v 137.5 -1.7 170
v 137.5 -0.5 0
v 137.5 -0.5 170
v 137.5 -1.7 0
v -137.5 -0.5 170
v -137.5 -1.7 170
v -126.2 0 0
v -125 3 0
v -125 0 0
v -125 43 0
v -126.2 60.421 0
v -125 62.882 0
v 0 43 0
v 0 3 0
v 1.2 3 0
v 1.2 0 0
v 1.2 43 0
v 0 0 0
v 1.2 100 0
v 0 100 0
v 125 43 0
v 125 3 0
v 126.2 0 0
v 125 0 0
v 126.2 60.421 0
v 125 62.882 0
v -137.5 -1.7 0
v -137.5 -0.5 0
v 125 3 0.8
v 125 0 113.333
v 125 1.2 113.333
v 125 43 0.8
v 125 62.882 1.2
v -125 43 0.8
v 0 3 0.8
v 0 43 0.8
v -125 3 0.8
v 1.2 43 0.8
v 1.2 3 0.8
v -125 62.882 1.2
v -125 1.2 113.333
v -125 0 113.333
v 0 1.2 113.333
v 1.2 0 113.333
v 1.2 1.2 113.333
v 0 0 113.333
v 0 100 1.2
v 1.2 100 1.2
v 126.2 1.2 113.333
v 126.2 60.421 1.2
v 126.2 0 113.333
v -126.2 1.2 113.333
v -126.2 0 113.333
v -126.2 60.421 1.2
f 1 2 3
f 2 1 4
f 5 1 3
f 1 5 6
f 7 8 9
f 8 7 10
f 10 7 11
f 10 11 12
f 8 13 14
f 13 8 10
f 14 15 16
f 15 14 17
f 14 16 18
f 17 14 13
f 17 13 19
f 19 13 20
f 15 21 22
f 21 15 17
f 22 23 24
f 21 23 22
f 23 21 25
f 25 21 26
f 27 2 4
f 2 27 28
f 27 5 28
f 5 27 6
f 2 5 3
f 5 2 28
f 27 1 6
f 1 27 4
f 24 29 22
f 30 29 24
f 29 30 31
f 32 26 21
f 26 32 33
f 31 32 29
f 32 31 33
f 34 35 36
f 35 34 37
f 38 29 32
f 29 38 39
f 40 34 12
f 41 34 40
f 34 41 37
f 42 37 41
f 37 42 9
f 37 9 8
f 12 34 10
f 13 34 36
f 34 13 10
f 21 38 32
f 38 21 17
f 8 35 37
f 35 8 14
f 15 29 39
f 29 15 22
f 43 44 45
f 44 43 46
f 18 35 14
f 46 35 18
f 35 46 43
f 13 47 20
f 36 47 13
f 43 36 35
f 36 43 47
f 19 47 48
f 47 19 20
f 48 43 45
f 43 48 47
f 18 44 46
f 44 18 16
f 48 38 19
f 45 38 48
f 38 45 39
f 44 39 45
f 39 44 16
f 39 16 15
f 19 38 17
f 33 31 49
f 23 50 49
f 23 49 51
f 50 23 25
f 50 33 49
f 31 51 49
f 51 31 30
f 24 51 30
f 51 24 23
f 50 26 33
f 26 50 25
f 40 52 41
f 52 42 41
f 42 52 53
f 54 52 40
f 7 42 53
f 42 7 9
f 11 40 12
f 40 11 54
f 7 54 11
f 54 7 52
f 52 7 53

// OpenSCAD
wall=1.2;
z=170;
x=275;
y=wall;
main=[x,y,z];

bed_d=280;
bed_h=300;

$fn=90;

base_x=250;
base_y=40;
base_z=0.8;

base_y_offset=3;

base=[base_x,base_y,base_z];

center_y=100;
gap=0.5;

intersection() {
    cylinder(d=bed_d,h=bed_h);
    union() {
        translate([-x/2,-gap-wall,0])
        cube(main);
        translate([-base_x/2,base_y_offset,0])
        cube(base);
        hull() {
            cube([wall,center_y,wall]);
            cube([wall,wall,z/3*2]);
        }
        thing();
        mirror([1,0,0])
        thing();
    }
}


module thing() {
    hull() {
        translate([base_x/2,0,0])
        cube([wall,wall,z/3*2]);
        intersection() {
            cylinder(d=bed_d,h=bed_h);
            translate([base_x/2,0,0])
            cube([wall,center_y,wall]);
        }
    }
}
